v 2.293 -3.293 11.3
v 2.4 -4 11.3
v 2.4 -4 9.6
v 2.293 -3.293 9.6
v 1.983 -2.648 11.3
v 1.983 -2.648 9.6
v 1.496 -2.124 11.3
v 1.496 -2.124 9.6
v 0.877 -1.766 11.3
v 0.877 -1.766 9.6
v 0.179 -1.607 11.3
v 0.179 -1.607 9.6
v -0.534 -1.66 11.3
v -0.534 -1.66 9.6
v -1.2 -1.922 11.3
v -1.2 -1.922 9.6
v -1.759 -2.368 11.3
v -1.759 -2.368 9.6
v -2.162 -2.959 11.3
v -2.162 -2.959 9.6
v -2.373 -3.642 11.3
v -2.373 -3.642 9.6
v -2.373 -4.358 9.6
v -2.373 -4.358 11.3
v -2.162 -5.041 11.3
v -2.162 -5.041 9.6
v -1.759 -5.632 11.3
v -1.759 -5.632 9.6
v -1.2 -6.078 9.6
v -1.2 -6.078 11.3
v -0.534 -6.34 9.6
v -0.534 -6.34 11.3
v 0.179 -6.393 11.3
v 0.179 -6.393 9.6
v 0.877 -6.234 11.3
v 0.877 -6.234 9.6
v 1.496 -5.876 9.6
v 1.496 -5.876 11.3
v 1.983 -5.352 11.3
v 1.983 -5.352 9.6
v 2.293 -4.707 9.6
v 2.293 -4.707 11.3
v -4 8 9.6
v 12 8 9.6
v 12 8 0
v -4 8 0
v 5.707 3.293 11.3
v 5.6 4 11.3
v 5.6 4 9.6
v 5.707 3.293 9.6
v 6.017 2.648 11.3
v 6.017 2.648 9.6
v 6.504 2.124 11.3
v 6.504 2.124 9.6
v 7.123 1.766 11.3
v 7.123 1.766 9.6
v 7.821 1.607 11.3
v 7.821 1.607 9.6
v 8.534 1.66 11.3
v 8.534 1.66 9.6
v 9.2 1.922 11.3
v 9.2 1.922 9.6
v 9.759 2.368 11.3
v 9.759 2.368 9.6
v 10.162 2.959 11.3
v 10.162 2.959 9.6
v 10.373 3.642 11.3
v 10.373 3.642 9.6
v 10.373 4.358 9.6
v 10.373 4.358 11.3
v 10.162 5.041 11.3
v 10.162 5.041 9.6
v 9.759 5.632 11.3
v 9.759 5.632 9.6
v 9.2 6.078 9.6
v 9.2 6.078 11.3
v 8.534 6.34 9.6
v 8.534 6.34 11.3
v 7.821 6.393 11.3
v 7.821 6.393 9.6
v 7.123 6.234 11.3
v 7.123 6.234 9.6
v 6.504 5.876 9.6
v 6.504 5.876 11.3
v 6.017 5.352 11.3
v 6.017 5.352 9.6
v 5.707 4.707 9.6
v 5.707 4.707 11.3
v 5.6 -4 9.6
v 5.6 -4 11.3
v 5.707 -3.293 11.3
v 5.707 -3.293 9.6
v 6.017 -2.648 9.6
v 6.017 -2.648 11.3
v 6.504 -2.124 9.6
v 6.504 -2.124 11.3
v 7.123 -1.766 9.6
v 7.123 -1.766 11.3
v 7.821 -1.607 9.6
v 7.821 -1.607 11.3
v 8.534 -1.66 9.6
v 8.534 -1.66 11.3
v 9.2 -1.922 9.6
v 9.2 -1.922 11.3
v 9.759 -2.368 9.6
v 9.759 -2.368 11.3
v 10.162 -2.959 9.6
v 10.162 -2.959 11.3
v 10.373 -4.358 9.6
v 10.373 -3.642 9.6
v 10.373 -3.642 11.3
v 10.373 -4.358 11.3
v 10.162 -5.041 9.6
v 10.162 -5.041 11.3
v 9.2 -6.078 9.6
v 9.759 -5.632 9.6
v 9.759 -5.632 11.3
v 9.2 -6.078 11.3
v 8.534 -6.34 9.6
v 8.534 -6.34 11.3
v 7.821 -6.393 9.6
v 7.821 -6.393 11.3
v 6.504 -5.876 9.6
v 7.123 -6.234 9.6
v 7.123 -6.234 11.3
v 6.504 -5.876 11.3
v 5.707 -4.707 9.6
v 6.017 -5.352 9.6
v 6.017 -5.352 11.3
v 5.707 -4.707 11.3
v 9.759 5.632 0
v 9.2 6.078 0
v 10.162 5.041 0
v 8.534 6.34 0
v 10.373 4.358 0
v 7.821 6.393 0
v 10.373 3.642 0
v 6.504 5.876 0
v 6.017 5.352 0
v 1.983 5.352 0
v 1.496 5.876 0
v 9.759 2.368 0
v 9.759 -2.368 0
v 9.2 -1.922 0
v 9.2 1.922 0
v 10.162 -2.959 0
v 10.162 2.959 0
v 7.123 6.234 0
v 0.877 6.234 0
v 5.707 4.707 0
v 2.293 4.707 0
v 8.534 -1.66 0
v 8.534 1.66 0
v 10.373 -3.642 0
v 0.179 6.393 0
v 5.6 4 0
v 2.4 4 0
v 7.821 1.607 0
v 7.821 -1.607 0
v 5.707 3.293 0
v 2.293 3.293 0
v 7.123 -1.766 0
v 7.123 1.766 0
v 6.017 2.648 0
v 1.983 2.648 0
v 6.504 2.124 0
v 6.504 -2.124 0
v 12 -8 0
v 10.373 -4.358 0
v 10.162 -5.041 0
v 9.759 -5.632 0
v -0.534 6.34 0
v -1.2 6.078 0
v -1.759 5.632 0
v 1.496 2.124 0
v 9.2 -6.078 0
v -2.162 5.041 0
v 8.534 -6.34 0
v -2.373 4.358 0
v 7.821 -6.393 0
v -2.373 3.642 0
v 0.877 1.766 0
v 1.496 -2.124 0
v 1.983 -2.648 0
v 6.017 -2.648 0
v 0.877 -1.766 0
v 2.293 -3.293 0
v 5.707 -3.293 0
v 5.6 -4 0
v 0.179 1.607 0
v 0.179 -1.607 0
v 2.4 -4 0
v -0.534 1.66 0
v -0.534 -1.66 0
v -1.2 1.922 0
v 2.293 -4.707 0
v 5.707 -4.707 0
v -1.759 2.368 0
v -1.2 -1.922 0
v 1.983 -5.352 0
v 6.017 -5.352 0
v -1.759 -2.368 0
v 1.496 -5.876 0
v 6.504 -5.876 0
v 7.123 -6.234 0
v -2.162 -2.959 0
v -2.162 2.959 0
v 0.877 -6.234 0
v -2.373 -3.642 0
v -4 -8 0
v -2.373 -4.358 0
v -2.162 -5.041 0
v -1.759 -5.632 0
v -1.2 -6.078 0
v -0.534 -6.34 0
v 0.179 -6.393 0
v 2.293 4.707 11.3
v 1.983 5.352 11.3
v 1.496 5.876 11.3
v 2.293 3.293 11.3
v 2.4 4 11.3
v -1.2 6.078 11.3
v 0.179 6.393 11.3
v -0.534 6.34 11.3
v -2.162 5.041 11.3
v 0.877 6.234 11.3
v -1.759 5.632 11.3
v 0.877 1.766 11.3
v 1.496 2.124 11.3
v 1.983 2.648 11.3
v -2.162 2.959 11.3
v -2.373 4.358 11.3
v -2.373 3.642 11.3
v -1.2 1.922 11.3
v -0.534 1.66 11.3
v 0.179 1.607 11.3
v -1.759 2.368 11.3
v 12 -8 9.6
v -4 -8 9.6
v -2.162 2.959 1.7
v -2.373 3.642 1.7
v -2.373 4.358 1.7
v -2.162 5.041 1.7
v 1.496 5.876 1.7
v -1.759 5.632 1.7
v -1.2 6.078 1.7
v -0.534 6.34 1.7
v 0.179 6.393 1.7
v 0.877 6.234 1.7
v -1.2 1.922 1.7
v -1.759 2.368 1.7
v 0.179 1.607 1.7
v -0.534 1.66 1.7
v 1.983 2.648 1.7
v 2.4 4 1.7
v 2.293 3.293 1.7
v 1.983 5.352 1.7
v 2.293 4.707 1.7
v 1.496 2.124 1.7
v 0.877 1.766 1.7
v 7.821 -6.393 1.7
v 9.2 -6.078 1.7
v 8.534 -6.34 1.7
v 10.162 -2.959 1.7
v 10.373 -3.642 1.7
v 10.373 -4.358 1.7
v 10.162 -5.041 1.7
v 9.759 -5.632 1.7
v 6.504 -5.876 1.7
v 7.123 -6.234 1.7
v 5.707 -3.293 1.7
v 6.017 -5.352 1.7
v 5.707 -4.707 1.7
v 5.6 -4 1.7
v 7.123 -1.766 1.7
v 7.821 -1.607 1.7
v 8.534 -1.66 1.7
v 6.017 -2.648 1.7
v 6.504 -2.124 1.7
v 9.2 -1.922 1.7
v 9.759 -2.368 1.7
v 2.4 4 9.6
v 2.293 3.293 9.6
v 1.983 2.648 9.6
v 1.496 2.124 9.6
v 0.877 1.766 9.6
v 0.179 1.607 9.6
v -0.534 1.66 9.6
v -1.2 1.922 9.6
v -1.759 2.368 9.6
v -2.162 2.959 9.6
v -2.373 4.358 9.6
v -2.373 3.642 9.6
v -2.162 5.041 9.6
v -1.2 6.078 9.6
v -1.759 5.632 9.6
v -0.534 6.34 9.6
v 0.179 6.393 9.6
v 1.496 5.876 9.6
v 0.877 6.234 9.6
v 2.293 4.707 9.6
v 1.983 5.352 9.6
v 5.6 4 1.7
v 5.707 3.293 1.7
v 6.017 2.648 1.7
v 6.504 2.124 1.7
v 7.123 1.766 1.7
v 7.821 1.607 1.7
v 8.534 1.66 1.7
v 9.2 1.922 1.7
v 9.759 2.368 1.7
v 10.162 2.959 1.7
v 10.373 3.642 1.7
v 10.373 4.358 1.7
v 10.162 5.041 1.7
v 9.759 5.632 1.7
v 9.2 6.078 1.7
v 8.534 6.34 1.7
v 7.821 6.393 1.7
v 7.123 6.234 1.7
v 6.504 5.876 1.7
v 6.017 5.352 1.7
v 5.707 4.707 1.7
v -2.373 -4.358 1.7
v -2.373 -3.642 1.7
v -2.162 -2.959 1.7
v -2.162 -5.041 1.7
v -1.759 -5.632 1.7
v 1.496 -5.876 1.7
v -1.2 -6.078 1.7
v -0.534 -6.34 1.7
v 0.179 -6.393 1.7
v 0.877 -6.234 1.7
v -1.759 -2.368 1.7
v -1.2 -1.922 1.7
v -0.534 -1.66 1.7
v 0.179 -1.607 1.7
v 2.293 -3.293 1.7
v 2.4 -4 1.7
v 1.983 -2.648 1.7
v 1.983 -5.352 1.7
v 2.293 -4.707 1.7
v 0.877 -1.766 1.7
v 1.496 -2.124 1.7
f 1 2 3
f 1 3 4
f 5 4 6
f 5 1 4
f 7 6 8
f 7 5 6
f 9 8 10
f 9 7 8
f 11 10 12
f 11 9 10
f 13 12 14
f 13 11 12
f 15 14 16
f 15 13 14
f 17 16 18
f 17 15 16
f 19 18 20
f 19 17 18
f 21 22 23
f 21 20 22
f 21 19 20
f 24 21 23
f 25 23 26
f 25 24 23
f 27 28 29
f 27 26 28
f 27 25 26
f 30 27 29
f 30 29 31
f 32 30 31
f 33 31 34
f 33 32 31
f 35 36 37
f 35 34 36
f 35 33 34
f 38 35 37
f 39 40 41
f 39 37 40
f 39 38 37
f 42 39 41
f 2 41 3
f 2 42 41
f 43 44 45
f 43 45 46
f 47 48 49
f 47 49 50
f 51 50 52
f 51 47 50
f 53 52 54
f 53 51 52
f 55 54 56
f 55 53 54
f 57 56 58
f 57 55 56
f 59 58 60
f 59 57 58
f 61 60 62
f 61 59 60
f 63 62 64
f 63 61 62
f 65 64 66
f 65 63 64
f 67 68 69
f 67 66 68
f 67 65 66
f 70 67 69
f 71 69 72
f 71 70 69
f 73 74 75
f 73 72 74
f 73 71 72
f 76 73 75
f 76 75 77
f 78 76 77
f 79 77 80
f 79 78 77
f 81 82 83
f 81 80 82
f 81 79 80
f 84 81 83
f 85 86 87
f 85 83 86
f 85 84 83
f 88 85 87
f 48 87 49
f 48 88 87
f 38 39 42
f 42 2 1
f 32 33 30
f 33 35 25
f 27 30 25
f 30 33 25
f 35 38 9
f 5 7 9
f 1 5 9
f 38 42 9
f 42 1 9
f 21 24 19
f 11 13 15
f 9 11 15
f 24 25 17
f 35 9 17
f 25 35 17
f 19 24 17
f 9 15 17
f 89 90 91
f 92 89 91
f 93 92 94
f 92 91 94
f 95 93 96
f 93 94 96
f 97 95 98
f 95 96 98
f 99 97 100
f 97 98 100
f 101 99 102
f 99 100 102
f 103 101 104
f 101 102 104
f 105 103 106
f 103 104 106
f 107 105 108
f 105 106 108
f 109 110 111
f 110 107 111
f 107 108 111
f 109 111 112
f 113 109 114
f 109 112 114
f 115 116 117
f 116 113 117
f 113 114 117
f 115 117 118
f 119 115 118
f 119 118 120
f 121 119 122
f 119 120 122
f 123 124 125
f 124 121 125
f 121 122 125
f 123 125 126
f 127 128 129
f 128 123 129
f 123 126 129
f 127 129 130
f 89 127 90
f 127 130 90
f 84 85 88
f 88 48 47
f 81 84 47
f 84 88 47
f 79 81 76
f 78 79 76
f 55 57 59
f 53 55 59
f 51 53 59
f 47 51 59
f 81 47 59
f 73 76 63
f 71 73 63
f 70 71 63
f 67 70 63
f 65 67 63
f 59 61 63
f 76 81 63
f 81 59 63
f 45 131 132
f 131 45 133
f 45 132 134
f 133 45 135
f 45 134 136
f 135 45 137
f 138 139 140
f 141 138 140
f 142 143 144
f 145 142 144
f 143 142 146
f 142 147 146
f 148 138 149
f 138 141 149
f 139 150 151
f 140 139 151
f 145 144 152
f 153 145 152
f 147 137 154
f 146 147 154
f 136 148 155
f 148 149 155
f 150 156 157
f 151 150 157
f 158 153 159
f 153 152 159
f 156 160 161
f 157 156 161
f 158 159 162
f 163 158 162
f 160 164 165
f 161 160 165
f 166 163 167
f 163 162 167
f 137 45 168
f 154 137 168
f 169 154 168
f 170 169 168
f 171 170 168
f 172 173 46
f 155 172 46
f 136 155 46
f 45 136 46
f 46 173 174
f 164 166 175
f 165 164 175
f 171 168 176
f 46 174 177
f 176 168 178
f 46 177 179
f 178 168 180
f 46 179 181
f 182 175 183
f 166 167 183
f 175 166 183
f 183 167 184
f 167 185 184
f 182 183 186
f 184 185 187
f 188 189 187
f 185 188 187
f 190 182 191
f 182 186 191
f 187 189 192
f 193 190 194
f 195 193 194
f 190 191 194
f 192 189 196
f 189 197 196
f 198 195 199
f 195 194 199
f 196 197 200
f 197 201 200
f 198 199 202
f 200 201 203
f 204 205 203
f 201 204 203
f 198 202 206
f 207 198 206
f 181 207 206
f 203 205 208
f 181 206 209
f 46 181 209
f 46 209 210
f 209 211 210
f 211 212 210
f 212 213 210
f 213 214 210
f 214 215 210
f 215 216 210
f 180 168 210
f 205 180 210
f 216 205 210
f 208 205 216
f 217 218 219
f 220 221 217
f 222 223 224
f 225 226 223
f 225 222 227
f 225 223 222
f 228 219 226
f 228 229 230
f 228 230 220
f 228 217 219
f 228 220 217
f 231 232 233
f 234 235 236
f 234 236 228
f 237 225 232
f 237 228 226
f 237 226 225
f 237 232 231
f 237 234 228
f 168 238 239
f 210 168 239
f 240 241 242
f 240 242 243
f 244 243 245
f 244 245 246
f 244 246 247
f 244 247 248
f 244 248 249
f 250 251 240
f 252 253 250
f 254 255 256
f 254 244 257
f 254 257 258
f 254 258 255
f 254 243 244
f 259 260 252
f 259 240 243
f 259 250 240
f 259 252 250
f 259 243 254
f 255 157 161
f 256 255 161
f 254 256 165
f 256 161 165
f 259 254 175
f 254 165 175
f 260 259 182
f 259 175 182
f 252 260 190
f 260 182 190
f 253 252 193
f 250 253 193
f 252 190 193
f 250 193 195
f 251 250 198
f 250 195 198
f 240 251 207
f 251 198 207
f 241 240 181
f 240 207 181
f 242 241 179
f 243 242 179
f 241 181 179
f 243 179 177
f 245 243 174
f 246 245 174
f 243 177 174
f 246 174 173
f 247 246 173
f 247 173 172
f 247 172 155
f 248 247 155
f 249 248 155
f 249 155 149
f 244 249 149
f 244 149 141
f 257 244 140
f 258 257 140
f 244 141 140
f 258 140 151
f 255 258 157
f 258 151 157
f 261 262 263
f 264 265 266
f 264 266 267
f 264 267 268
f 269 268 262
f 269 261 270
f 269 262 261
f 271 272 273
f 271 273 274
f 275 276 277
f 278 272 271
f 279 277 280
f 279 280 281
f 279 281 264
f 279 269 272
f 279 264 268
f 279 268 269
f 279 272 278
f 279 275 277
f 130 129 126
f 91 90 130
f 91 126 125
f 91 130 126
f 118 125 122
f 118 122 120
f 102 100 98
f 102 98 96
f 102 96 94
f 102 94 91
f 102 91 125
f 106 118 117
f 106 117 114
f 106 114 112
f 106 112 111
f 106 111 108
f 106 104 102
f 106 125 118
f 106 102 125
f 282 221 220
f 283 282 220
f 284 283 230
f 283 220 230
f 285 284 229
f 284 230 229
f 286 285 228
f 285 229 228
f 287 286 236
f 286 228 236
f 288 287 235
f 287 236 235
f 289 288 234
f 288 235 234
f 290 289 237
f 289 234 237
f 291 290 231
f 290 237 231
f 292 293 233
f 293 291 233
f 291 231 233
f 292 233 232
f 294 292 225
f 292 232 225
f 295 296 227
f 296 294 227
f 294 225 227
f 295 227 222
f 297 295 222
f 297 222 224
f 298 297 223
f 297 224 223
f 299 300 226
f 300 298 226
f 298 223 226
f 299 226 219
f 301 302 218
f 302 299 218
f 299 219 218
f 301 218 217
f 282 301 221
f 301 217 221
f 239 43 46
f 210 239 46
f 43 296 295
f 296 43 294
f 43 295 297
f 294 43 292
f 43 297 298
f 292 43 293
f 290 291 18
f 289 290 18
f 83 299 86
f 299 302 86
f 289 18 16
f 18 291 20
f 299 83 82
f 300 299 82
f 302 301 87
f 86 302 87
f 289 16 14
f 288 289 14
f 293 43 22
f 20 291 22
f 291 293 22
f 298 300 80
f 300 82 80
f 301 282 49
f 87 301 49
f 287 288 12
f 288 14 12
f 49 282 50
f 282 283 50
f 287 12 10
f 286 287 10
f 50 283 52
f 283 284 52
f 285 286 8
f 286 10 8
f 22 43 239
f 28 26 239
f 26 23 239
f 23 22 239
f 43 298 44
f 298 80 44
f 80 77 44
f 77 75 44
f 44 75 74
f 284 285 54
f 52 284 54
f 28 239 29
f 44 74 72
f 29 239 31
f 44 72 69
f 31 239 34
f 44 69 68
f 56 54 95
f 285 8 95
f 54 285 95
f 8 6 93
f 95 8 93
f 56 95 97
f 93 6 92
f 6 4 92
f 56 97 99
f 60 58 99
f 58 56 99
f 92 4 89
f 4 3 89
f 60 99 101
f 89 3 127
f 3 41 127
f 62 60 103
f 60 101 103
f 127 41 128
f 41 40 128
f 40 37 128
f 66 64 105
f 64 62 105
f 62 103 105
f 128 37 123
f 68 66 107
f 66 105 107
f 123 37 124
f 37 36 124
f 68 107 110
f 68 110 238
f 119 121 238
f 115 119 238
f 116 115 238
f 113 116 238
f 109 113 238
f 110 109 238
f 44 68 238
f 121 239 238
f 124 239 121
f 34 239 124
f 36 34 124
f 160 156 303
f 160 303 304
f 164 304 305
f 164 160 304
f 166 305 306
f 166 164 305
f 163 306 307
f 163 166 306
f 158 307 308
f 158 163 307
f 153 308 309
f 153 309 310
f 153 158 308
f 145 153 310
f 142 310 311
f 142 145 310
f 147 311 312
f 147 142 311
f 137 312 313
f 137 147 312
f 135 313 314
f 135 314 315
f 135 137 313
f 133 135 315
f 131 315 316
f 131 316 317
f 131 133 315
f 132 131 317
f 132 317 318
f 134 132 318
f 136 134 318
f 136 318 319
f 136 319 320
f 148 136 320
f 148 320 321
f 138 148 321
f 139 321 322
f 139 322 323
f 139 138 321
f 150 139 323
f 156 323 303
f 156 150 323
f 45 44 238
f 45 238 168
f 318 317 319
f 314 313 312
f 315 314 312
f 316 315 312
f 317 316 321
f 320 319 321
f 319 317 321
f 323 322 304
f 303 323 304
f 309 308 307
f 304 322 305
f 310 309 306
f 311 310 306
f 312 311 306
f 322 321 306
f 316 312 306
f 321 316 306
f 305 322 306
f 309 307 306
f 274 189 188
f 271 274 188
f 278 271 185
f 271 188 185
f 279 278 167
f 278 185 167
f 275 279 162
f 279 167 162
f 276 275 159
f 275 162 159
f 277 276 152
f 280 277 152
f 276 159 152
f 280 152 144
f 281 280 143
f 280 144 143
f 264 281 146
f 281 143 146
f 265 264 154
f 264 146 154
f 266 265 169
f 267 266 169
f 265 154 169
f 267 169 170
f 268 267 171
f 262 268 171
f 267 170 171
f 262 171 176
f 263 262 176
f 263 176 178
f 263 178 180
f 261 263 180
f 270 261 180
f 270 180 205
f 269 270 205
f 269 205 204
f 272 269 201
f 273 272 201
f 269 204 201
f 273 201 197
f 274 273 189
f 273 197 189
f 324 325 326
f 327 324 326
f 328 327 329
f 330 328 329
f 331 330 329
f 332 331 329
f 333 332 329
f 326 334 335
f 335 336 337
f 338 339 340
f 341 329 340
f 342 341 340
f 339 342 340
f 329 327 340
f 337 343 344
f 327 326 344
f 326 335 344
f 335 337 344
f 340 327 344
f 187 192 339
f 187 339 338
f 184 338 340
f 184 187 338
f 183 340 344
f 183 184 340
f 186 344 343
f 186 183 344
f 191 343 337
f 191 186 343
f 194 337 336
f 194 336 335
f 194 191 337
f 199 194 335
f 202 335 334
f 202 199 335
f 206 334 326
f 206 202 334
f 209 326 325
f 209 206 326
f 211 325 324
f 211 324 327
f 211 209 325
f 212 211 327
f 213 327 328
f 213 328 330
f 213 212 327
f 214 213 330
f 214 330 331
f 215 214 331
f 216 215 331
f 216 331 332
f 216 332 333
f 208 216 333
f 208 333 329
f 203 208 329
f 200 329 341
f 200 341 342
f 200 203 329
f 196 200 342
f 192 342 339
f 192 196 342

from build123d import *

# Parameters (mm, degrees)
F1_DEPTH = 8
F3_W     = 8
F3_H     = 8
F3_R     = 2.4
F4_DEPTH = 1.7
F5_R     = 2.4
F6_DEPTH = 1.7


with BuildPart() as f1:
    # F0 (on Front) → F1 (new body)
    with BuildSketch(Plane.XZ):
        Polygon((-2.4, 9.6), (-4, 9.6), (-4, 0), (4, 0), (4, 9.6), (2.4, 9.6), (2.4, 11.3), (-2.4, 11.3), align=None)
    extrude(amount=F1_DEPTH)

    # F3 (on plane+point) → F4 (cut, through all)
    with BuildSketch(Plane.XY.offset(11.3)):
        with Locations((0, -4)):
            Rectangle(F3_W, F3_H)
        with Locations((0, -4)):
            Circle(F3_R, mode=Mode.SUBTRACT)
    extrude(amount=-F4_DEPTH, mode=Mode.SUBTRACT)

    # F5 (on Top) → F6 (cut)
    with BuildSketch(Plane.XY):
        with Locations((0, -4)):
            Circle(F5_R)
    extrude(amount=F6_DEPTH, mode=Mode.SUBTRACT)

    # F8: F1 across plane


with BuildPart() as f1_1:
    add(f1.part)
    add(f1.part.mirror(Plane.YZ.offset(4)))

    # F9: F1 across plane


with BuildPart() as f1_2:
    add(f1_1.part)
    add(f1_1.part.mirror(Plane.XZ))


solid = f1_2.part
